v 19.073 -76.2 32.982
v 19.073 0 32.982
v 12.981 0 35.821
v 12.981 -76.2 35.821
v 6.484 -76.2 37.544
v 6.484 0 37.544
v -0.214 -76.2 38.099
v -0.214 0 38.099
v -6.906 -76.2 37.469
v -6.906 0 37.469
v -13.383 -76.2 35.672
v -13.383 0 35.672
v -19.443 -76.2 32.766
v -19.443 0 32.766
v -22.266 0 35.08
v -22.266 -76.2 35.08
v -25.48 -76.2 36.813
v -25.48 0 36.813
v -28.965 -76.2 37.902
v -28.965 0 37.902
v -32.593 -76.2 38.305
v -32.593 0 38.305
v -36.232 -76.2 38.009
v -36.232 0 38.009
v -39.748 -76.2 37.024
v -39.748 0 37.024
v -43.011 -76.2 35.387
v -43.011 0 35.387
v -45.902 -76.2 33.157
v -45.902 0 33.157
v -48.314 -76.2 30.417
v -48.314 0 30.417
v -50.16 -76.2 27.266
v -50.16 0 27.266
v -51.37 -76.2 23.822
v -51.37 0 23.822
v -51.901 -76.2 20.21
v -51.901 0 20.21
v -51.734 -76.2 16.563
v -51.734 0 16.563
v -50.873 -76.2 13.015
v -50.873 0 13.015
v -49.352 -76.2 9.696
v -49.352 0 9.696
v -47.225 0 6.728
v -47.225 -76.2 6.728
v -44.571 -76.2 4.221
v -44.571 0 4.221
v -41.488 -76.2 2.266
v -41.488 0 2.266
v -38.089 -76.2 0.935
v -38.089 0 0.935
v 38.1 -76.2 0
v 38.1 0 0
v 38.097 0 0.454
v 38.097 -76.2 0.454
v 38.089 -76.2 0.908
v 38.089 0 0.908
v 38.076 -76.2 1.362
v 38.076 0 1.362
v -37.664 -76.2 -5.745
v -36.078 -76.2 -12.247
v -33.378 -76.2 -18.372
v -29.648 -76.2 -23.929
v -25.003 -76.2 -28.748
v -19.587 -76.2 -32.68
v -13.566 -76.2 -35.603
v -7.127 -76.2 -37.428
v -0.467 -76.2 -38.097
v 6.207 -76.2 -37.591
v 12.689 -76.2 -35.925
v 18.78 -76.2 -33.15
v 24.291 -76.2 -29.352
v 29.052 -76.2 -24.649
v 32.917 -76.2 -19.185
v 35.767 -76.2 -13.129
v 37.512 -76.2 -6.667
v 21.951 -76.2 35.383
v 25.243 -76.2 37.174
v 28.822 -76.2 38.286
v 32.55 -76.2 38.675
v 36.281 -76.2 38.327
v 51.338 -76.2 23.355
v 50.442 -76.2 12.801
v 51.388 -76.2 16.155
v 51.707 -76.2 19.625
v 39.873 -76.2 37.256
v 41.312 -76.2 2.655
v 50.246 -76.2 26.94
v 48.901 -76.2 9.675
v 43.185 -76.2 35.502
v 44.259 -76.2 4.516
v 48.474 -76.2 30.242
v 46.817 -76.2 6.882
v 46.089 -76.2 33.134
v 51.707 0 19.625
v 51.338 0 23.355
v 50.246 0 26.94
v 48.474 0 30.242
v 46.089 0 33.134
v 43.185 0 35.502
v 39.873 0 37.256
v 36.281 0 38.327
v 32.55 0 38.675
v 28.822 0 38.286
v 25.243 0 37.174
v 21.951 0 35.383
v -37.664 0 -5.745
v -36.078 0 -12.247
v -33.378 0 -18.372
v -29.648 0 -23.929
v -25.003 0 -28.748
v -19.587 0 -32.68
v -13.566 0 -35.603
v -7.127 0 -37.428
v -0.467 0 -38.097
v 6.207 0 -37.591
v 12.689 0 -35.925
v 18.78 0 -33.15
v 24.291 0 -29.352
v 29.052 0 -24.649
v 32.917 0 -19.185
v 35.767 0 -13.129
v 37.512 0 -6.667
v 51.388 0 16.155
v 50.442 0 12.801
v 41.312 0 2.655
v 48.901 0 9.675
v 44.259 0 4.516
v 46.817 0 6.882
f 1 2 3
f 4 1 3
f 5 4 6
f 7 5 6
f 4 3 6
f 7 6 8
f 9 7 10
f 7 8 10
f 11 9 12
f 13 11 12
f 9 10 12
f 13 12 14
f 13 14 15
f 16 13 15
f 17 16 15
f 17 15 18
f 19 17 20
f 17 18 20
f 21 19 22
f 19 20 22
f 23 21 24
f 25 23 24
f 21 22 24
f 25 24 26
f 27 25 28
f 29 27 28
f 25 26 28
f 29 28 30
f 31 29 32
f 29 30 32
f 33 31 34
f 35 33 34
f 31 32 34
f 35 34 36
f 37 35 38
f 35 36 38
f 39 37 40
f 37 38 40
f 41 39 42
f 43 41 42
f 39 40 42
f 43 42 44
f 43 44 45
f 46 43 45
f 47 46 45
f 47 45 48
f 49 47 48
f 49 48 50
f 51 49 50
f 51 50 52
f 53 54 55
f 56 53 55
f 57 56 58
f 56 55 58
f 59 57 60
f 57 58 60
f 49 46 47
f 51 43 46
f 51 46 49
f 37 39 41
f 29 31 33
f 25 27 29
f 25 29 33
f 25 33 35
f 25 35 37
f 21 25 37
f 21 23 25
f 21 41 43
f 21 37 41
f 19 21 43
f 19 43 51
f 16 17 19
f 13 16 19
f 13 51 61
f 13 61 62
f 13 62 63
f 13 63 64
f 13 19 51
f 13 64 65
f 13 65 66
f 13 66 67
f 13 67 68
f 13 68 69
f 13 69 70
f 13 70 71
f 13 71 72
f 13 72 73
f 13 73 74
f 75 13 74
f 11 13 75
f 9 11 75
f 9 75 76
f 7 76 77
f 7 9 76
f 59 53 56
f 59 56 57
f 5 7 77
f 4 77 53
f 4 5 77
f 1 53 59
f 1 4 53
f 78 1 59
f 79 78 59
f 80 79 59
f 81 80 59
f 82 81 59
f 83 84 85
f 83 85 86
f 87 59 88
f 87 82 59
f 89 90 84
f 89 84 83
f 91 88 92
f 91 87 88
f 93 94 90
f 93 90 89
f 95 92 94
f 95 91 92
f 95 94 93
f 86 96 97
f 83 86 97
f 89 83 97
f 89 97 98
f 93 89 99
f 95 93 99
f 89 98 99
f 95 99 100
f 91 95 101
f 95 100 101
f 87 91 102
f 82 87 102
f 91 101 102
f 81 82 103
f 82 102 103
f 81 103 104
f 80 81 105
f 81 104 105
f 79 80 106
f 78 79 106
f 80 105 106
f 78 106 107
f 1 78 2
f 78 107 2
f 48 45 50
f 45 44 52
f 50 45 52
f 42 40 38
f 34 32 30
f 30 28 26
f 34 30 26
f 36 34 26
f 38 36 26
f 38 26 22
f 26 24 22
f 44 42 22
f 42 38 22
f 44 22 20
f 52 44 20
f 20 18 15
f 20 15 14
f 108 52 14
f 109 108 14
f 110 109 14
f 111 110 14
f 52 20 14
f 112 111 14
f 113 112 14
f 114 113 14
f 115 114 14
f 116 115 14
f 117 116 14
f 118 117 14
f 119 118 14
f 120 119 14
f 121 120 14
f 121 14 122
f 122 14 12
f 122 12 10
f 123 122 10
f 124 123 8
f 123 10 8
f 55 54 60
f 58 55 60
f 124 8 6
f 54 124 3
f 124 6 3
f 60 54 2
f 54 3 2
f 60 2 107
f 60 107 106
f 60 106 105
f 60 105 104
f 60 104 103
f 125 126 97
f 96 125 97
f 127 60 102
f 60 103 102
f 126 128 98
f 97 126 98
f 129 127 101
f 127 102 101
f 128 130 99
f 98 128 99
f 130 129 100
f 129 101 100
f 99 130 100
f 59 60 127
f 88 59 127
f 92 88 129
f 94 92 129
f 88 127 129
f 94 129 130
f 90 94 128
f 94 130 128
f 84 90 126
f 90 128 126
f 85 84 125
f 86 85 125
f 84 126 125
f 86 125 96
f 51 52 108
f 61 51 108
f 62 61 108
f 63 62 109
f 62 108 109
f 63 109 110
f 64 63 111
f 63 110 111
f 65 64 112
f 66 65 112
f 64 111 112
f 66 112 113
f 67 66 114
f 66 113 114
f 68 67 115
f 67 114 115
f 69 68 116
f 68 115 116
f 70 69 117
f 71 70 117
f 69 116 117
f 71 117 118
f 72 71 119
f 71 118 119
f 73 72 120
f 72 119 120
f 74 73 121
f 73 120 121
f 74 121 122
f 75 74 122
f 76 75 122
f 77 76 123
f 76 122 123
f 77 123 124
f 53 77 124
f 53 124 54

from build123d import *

# Parameters (mm, degrees)
F1_DEPTH = 76.2


with BuildPart() as f1:
    # F0 (on Front) → F1 (new body)
    with BuildSketch(Plane.XZ):
        with BuildLine():
            Line((0, 0), (16.3282829281, 9.8127303346))
            ThreePointArc((16.3282829281, 9.8127303346), (13.7388791973, 21.866806576), (19.0733598326, 32.9820700487))
            ThreePointArc((19.0733598326, 32.9820700487), (-0.2140813256, 38.099398541), (-19.4427976439, 32.7656469458))
            ThreePointArc((-19.4427976439, 32.7656469458), (-15.2854652775, 26.5722258682), (-13.825048557, 19.2572371428))
            ThreePointArc((-13.825048557, 19.2572371428), (-14.4897645301, 14.2688675447), (-16.4375242785, 9.6286185714))
            Line((-16.4375242785, 9.6286185714), (0, 0))
        make_face()
        with BuildLine():
            ThreePointArc((32.6565658563, 19.6254606691), (36.5259490937, 10.8381291192), (38.0756304159, 1.3624861223))
            ThreePointArc((38.0756304159, 1.3624861223), (47.9231253878, 8.2309593606), (51.7065658563, 19.6254606691))
            ThreePointArc((51.7065658563, 19.6254606691), (39.8726044249, 37.2558687011), (19.0733598326, 32.9820700487))
            ThreePointArc((19.0733598326, 32.9820700487), (26.7132187591, 27.1664120474), (32.6565658563, 19.6254606691))
        make_face()
        with BuildLine():
            ThreePointArc((16.3282829281, 9.8127303346), (25.7569703489, 1.8688258011), (38.0756304159, 1.3624861223))
            ThreePointArc((38.0756304159, 1.3624861223), (36.5259490937, 10.8381291192), (32.6565658563, 19.6254606691))
            Line((32.6565658563, 19.6254606691), (16.3282829281, 9.8127303346))
        make_face()
        with BuildLine():
            Line((16.3282829281, 9.8127303346), (32.6565658563, 19.6254606691))
            ThreePointArc((32.6565658563, 19.6254606691), (26.7132187591, 27.1664120474), (19.0733598326, 32.9820700487))
            ThreePointArc((19.0733598326, 32.9820700487), (13.7388791973, 21.866806576), (16.3282829281, 9.8127303346))
        make_face()
        with BuildLine():
            ThreePointArc((-38.0885373309, 0.934518054), (-0.4672941756, -38.0971342249), (38.1, 0))
            ThreePointArc((38.1, 0), (38.0939071168, 0.6813520217), (38.0756304159, 1.3624861223))
            ThreePointArc((38.0756304159, 1.3624861223), (25.7569703489, 1.8688258011), (16.3282829281, 9.8127303346))
            Line((16.3282829281, 9.8127303346), (0, 0))
            Line((0, 0), (-16.4375242785, 9.6286185714))
            ThreePointArc((-16.4375242785, 9.6286185714), (-25.7763452104, 1.5792590119), (-38.0885373309, 0.934518054))
        make_face()
        with BuildLine():
            ThreePointArc((-19.4427976439, 32.7656469458), (-49.3125728356, 28.8858557141), (-38.0885373309, 0.934518054))
            ThreePointArc((-38.0885373309, 0.934518054), (-36.6454381775, 10.4269775477), (-32.875048557, 19.2572371428))
            ThreePointArc((-32.875048557, 19.2572371428), (-27.0168196061, 26.8645018262), (-19.4427976439, 32.7656469458))
        make_face()
        with BuildLine():
            ThreePointArc((-32.875048557, 19.2572371428), (-36.6454381775, 10.4269775477), (-38.0885373309, 0.934518054))
            ThreePointArc((-38.0885373309, 0.934518054), (-25.7763452104, 1.5792590119), (-16.4375242785, 9.6286185714))
            Line((-16.4375242785, 9.6286185714), (-32.875048557, 19.2572371428))
        make_face()
        with BuildLine():
            ThreePointArc((-19.4427976439, 32.7656469458), (-27.0168196061, 26.8645018262), (-32.875048557, 19.2572371428))
            Line((-32.875048557, 19.2572371428), (-16.4375242785, 9.6286185714))
            ThreePointArc((-16.4375242785, 9.6286185714), (-14.4897645301, 14.2688675447), (-13.825048557, 19.2572371428))
            ThreePointArc((-13.825048557, 19.2572371428), (-15.2854652775, 26.5722258682), (-19.4427976439, 32.7656469458))
        make_face()
    extrude(amount=F1_DEPTH)


solid = f1.part
